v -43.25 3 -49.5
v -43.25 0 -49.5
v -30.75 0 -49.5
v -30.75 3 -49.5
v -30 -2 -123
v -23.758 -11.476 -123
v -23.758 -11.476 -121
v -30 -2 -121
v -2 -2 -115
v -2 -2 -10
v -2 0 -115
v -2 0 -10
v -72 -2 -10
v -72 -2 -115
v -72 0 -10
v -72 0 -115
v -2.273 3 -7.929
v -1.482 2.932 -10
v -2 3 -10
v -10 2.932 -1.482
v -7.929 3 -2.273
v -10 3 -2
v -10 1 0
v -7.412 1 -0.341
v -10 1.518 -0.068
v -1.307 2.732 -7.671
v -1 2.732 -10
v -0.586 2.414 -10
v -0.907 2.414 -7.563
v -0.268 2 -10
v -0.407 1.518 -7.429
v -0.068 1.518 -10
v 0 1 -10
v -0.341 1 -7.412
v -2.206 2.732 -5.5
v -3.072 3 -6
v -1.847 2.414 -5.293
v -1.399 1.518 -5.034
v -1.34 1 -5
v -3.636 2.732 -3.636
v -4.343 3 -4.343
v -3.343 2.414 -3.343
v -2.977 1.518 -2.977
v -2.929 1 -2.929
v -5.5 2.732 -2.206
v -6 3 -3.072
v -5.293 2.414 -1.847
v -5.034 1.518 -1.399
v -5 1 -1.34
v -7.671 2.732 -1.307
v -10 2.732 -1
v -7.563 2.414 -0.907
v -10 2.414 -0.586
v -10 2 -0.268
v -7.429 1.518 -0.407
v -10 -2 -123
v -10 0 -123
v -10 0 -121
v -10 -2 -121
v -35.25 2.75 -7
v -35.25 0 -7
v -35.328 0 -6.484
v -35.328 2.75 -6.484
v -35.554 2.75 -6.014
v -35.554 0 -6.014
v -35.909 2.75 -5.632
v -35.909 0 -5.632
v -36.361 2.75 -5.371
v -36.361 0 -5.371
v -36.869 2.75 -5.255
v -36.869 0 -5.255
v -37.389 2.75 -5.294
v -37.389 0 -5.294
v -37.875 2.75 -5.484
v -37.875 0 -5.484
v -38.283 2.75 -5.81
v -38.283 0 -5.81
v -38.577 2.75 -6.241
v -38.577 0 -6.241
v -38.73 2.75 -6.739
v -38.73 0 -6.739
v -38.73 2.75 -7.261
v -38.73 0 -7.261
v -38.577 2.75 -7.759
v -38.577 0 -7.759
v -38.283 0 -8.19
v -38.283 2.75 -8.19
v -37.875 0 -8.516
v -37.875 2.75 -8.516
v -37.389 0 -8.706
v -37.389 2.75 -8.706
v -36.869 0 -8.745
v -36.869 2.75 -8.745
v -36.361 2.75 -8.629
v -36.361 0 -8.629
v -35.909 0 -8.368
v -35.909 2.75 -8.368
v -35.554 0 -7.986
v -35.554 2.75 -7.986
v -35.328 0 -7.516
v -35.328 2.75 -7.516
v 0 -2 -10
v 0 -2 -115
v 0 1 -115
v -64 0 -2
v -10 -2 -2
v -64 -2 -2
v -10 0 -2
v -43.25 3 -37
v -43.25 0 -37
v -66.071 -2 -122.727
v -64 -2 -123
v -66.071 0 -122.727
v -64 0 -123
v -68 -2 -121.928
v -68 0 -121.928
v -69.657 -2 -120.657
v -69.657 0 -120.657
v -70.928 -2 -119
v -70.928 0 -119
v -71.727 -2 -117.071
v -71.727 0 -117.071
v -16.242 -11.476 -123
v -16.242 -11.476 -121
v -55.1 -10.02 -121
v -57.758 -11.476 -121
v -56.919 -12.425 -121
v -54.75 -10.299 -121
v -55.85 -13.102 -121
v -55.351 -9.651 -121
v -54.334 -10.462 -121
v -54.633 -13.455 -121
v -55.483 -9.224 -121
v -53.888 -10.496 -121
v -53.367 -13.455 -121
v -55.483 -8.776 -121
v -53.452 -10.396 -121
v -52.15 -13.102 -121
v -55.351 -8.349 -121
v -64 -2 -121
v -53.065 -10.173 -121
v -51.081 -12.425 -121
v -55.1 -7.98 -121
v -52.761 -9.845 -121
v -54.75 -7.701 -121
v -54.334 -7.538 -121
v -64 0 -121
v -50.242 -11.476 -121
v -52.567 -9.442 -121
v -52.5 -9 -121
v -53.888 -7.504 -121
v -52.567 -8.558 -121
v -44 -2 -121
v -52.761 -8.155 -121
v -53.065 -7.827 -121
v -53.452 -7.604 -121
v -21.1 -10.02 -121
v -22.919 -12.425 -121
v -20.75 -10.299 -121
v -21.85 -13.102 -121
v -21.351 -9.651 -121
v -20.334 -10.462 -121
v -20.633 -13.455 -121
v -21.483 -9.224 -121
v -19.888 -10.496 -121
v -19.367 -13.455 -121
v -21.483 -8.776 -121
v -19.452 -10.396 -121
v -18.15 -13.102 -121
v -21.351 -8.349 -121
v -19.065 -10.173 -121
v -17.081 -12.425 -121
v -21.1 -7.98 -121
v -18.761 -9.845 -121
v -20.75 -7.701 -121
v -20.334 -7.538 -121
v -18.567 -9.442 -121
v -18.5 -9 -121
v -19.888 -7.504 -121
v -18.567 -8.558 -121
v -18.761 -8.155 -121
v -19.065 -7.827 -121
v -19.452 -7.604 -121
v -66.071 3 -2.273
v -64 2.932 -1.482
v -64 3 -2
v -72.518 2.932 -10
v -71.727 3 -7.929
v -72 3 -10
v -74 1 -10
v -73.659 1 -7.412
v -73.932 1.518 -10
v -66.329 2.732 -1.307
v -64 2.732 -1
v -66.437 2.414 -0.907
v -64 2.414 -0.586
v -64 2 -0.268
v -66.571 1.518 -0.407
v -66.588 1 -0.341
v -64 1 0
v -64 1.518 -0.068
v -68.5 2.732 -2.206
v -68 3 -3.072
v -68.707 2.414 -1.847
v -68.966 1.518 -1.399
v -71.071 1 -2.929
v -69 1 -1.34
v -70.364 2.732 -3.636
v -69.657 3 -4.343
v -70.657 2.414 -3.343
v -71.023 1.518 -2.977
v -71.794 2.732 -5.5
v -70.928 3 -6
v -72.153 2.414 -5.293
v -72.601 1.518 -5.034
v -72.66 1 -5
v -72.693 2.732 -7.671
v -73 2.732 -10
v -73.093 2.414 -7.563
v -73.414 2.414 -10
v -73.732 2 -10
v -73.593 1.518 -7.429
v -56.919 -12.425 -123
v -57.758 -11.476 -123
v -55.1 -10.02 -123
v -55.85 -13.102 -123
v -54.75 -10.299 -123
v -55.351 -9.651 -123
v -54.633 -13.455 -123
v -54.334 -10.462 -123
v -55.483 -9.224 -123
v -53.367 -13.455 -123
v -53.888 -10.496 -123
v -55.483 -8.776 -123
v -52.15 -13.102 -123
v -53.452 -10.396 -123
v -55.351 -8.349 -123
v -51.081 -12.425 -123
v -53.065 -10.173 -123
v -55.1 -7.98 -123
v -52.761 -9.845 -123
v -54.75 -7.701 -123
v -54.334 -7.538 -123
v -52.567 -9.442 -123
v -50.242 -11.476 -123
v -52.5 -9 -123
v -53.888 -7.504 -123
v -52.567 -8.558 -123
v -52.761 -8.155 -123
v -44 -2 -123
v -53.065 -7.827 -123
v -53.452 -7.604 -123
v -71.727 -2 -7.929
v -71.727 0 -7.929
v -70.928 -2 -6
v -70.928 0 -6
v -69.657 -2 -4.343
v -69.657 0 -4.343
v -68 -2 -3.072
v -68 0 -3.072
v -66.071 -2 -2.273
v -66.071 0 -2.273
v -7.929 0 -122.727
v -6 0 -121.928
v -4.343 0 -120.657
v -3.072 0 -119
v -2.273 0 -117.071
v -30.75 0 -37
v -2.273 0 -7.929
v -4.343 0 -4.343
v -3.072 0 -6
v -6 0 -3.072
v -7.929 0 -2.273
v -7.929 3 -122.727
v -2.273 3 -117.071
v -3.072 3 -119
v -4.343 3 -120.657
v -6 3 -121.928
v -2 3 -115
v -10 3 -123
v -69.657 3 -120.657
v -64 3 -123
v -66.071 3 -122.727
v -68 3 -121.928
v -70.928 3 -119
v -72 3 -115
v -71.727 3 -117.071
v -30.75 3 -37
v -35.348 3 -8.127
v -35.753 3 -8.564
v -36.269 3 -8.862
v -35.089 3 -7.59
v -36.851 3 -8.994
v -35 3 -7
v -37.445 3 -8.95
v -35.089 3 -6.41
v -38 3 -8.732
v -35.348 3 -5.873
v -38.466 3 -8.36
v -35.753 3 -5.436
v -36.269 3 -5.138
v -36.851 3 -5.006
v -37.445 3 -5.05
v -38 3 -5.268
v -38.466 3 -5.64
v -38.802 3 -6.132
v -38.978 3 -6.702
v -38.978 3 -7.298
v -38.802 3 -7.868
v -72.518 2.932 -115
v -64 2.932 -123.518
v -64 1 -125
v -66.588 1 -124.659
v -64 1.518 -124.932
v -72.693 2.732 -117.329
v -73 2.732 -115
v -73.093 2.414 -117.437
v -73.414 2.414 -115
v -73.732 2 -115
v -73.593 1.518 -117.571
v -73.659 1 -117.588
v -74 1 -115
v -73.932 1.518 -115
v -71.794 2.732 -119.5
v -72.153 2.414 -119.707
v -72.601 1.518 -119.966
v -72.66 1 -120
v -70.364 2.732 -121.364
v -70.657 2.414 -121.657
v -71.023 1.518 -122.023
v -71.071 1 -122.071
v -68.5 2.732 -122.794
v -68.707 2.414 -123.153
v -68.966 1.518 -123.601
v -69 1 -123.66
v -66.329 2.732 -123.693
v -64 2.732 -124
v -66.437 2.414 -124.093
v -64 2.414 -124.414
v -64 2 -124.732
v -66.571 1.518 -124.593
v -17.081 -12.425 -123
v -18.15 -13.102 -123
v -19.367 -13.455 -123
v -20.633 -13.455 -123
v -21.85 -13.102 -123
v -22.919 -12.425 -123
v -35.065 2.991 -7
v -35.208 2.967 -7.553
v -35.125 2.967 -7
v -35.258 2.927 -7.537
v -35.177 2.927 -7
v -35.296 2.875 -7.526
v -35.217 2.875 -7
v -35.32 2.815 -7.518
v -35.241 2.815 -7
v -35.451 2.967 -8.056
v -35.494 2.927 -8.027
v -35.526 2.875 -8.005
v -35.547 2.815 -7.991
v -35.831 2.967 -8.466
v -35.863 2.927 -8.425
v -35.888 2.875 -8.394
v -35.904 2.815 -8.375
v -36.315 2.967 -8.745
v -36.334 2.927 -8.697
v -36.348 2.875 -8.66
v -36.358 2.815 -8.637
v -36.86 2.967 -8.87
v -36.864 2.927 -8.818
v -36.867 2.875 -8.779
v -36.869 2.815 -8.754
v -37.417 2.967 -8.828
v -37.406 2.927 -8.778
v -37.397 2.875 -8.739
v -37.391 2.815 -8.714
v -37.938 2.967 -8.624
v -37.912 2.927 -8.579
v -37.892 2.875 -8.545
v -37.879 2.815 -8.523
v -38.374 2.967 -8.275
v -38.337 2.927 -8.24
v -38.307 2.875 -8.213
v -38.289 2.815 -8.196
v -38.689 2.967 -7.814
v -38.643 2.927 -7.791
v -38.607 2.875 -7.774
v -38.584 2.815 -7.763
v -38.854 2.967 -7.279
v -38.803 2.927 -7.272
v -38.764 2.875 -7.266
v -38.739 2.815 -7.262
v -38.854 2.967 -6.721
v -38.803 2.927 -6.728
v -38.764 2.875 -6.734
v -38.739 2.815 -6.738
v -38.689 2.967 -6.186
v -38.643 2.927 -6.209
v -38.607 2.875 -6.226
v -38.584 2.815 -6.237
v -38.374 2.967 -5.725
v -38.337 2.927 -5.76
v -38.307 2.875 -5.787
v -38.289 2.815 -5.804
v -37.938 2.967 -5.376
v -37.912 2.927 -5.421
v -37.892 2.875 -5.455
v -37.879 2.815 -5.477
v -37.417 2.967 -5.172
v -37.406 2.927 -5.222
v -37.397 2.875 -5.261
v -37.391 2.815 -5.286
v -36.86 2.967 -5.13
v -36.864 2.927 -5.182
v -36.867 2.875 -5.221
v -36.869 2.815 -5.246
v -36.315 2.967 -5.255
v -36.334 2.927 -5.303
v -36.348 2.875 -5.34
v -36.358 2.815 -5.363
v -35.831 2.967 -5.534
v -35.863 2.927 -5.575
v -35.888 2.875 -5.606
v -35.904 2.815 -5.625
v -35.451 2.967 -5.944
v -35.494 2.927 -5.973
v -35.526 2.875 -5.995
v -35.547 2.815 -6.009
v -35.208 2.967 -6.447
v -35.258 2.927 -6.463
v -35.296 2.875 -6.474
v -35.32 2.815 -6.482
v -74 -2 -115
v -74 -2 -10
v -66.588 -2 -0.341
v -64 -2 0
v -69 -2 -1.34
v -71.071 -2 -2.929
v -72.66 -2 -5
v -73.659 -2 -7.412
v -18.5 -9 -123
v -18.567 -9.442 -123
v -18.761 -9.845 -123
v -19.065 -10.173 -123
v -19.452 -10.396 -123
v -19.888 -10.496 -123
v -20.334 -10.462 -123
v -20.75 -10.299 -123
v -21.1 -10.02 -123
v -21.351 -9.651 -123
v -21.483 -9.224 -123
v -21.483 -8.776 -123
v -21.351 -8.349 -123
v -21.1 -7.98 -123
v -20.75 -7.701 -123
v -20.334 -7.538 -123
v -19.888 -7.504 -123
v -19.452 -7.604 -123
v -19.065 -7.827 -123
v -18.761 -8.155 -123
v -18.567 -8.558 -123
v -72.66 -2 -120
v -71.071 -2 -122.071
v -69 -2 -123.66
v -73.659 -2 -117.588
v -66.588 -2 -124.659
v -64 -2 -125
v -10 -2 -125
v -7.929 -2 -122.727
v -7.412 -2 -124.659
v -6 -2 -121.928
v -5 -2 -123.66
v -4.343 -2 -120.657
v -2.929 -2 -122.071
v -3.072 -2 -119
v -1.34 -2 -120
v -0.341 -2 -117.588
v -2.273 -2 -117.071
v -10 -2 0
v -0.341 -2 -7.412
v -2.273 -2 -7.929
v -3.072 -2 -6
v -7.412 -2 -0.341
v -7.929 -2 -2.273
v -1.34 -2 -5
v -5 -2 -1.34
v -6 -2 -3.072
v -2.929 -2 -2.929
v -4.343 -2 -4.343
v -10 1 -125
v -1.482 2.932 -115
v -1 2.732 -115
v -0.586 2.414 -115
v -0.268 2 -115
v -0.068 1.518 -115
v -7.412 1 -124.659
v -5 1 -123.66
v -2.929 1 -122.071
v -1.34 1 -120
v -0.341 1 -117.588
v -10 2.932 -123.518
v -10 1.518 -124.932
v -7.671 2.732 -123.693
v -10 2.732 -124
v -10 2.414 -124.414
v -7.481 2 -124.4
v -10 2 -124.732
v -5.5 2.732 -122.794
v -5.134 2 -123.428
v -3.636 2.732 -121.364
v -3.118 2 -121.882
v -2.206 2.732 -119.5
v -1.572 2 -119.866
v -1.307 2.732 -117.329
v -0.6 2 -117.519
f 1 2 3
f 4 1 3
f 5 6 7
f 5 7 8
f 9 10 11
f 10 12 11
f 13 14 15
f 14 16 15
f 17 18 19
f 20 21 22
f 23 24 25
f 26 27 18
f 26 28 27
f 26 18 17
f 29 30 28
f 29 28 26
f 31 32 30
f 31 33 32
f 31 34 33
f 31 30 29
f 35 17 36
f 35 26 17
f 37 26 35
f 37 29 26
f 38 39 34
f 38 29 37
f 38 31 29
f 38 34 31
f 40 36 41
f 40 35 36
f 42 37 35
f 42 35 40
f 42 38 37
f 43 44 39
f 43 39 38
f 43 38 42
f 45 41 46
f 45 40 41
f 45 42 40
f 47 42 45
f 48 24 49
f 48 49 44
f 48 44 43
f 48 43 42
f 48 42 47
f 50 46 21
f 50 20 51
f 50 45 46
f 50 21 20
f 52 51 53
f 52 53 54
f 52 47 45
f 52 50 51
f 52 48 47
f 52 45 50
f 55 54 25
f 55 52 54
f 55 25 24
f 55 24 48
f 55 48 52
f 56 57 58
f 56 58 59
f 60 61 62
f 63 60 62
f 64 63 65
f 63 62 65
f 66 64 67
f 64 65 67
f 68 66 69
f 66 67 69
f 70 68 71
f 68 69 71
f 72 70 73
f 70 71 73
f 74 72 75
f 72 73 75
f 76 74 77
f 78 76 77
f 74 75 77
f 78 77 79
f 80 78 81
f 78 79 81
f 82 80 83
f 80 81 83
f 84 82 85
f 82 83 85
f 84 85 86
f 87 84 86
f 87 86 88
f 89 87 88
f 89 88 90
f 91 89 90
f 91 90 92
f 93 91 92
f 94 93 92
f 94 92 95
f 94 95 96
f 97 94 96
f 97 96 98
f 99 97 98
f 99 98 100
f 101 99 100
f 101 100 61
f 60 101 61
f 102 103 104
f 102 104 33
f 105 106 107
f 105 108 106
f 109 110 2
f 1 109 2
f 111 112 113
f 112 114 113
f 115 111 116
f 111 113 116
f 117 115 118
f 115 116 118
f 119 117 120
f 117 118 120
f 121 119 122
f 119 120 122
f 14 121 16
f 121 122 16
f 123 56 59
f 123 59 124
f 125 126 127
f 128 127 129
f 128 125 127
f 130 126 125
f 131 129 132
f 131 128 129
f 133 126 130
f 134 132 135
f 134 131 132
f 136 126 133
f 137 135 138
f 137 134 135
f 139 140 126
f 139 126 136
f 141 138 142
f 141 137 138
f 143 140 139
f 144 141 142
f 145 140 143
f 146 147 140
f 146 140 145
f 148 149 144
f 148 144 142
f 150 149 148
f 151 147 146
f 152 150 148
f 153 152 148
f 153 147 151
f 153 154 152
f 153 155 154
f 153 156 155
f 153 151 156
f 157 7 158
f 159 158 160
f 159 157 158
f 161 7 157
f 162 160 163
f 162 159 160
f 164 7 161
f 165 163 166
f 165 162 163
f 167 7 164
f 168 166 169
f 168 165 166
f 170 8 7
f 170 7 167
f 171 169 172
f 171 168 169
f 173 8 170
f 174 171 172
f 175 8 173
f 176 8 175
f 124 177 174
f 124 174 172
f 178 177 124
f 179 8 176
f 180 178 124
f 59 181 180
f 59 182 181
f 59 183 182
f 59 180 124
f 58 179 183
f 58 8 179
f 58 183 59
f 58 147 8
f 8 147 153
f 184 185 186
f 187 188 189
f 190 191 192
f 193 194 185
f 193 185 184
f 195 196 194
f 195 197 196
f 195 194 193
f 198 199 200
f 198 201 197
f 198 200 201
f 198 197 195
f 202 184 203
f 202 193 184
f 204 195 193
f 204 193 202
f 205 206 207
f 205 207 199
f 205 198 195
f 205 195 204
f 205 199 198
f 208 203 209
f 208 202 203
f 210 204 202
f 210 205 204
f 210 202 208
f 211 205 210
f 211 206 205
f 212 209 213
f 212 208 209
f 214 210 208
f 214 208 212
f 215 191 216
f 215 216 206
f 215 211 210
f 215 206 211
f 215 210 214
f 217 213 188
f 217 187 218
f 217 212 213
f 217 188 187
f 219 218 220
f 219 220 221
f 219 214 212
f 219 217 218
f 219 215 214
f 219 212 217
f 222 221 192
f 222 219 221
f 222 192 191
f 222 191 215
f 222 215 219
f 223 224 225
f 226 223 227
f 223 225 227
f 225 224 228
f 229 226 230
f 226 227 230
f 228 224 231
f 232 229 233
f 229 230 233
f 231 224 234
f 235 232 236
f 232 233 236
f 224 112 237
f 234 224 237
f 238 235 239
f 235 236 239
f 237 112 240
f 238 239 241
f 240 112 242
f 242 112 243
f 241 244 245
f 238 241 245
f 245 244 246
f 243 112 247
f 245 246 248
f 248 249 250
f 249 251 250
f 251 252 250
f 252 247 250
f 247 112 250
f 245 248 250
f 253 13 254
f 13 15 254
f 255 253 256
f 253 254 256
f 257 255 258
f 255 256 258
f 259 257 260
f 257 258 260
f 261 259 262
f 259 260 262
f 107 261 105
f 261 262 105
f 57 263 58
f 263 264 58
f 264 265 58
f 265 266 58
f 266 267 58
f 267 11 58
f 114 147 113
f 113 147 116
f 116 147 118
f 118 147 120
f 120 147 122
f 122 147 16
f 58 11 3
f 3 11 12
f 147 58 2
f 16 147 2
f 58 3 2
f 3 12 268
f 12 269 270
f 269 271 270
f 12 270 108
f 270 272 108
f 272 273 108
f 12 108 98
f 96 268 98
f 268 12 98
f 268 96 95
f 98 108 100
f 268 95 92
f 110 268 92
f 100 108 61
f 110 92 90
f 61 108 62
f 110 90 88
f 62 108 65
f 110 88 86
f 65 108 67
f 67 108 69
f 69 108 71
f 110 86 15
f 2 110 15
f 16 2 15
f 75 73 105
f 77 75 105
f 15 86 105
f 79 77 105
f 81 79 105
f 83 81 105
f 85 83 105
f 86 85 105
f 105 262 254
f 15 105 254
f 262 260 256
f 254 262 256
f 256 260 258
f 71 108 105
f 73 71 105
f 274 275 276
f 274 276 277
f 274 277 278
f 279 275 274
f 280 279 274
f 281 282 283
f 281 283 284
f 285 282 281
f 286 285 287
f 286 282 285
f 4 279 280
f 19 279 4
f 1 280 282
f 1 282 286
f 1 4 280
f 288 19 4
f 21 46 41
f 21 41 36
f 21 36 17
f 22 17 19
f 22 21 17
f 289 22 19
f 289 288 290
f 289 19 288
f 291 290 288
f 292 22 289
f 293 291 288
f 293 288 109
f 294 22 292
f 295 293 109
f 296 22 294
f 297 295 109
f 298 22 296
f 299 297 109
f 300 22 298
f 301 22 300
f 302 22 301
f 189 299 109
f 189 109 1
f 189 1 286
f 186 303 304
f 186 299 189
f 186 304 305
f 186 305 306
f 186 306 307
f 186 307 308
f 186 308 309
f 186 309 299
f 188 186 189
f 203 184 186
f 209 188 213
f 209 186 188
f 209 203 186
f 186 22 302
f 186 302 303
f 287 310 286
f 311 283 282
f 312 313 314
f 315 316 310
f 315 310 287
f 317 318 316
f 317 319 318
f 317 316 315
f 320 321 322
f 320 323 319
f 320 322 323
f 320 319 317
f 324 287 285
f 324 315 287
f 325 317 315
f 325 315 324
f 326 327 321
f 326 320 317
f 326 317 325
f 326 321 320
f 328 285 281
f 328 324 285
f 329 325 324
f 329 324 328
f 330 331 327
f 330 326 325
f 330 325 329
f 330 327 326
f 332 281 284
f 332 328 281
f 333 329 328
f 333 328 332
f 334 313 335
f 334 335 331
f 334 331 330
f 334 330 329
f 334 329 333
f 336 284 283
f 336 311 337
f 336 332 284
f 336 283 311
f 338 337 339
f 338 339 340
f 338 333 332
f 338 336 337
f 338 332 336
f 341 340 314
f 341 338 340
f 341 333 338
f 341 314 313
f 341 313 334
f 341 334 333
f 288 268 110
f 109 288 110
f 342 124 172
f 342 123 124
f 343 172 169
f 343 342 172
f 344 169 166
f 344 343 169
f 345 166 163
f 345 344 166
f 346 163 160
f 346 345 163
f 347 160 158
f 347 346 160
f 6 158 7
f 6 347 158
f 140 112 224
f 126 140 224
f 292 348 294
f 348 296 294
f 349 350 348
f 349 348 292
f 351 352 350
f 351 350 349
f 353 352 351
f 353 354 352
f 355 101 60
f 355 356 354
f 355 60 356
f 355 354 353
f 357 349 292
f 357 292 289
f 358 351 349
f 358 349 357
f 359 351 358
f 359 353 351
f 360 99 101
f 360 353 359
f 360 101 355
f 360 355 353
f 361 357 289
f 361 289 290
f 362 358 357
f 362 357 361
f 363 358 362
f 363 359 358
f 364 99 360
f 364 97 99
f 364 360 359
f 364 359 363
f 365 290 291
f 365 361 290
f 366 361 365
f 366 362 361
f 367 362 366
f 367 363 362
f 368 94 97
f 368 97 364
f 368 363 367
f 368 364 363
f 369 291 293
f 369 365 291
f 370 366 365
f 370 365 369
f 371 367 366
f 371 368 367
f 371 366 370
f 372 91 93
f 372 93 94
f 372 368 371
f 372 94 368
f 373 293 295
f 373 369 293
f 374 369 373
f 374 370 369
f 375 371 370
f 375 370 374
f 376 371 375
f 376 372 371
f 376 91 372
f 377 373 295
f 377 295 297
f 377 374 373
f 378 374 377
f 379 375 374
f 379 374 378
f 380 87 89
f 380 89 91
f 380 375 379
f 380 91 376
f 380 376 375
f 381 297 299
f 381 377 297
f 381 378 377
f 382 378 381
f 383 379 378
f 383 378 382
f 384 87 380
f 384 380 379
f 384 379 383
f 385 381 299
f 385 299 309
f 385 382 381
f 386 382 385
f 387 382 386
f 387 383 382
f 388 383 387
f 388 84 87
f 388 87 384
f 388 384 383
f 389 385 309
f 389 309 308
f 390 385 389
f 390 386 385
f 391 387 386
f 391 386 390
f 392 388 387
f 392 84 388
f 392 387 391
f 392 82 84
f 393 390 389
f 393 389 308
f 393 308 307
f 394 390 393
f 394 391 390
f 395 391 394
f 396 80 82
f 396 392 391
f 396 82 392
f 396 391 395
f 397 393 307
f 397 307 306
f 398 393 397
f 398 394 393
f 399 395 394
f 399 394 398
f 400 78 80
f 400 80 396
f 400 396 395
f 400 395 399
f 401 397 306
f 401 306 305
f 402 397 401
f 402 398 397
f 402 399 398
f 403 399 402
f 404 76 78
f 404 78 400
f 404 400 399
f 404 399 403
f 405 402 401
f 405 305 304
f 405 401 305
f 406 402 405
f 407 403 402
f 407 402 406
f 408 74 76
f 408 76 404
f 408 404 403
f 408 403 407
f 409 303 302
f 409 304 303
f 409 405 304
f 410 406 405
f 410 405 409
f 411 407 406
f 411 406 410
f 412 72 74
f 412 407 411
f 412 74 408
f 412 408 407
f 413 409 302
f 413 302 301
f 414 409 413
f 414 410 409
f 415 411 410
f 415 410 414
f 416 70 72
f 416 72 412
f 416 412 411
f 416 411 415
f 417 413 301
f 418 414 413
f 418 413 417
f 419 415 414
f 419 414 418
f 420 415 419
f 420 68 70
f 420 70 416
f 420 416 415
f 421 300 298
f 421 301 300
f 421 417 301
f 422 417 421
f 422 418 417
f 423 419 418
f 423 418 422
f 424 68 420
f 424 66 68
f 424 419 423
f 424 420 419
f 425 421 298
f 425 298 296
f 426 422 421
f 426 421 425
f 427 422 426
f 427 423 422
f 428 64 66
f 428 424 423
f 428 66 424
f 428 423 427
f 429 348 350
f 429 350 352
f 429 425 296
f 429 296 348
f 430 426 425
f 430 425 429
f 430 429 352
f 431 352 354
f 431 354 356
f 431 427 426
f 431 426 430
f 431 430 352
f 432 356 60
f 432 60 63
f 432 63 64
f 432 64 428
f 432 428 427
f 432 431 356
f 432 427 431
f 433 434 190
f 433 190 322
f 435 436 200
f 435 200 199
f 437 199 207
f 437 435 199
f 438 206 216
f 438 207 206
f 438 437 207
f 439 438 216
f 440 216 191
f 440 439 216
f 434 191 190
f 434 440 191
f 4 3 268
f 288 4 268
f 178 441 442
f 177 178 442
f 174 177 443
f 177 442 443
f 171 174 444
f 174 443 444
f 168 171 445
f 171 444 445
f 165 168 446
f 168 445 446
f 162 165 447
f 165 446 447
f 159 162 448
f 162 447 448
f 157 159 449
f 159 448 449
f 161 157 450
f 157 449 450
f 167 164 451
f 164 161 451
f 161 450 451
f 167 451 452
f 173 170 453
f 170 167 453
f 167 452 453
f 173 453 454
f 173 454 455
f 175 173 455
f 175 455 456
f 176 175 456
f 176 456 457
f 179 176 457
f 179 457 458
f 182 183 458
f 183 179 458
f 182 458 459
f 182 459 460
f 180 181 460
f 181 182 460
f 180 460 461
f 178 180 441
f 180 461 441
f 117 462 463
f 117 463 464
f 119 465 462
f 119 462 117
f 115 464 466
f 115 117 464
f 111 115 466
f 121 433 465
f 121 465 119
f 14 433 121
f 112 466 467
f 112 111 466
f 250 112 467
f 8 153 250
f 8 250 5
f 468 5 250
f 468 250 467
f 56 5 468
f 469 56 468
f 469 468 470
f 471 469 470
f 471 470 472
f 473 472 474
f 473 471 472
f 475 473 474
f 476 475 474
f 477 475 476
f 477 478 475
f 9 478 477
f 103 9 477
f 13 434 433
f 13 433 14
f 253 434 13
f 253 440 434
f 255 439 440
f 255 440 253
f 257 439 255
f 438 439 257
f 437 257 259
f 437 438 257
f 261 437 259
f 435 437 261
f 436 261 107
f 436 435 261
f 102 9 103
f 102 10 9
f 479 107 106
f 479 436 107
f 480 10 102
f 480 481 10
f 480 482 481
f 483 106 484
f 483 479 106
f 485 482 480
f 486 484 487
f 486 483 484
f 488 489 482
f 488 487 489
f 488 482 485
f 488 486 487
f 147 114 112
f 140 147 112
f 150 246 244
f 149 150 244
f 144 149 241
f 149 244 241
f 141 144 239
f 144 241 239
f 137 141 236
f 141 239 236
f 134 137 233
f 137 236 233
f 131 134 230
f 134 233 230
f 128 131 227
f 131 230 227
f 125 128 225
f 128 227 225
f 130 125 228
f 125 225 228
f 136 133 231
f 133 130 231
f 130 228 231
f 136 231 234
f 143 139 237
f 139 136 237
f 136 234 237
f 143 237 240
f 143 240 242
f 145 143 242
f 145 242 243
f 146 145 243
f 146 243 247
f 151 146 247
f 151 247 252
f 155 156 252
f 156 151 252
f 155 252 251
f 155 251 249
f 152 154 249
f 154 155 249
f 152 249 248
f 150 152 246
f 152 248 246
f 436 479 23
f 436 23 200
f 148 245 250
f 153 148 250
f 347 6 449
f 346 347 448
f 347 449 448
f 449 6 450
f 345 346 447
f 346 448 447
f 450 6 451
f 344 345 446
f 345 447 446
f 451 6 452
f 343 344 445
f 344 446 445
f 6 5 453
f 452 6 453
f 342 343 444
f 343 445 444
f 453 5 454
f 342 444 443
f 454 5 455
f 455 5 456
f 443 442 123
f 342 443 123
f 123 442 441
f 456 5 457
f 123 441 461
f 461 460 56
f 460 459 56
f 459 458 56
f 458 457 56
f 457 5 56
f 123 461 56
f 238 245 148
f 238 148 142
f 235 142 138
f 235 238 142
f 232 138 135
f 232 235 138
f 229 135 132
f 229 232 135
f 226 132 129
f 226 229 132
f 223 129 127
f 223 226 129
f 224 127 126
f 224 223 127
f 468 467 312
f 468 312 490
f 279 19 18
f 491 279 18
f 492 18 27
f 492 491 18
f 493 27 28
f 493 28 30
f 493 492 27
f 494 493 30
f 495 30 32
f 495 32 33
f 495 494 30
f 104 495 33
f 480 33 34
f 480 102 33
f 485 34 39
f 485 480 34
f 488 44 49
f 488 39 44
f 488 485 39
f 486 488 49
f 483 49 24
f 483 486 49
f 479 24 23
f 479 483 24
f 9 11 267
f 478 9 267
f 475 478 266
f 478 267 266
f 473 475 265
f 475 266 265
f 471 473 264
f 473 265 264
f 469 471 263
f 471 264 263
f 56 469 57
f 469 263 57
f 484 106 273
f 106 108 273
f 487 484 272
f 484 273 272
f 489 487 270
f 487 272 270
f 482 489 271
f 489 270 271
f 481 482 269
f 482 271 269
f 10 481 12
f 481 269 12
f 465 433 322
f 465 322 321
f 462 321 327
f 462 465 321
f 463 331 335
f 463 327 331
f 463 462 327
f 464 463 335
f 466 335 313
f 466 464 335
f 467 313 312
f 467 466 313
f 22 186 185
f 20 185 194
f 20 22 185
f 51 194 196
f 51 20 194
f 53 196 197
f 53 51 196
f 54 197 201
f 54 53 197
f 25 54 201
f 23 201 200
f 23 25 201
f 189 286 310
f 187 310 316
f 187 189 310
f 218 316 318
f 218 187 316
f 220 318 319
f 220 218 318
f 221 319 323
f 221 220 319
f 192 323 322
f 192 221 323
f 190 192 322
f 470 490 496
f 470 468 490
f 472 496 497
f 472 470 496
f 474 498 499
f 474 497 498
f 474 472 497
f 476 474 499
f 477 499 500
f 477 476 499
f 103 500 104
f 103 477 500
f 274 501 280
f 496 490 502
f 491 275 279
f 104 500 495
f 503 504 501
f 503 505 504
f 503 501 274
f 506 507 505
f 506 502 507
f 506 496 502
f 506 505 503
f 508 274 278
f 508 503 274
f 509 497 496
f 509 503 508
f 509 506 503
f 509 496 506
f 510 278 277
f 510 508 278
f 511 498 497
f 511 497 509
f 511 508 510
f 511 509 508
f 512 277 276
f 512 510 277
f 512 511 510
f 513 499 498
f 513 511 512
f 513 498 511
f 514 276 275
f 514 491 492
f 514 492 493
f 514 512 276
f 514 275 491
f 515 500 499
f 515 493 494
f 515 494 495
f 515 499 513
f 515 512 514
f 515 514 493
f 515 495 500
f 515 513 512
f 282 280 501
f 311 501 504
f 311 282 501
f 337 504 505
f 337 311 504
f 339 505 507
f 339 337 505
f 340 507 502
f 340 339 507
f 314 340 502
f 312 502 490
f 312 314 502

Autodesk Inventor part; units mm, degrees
ref_plane "YZ Plane" through (0, 0, 0) normal (1, 0, 0) x (0, 1, 0)
ref_plane "XZ Plane" through (0, 0, 0) normal (0, 1, 0) x (-1, 0, 0)
ref_plane "XY Plane" through (0, 0, 0) normal (0, 0, 1) x (1, 0, 0)
sketch "Sketch1" plane through (0, 0, 0) normal (0, 1, 0) x (-1, 0, 0)
  line L0 (10, 0) -> (64, 0)
  line L1 (74, -10) -> (74, -115)
  line L2 (64, -125) -> (10, -125)
  line L3 (0, -115) -> (0, -10)
  arc A0 (74, -10) -> (64, 0) centre (64, -10) ccw
  arc A1 (10, 0) -> (0, -10) centre (10, -10) ccw
  arc A2 (0, -115) -> (10, -125) centre (10, -115) ccw
  arc A3 (64, -125) -> (74, -115) centre (64, -115) ccw
  point P0 (0, 0)
  point P1 (74, -125)
  point P2 (0, -125)
  dimension "d0" = 125
  dimension "d1" = 74
  dimension "d2" = 10
extrude "Extrusion1" add sketch "Sketch1" along normal blind 3
sketch "Sketch3" plane through (0, 0, 0) normal (0, -1, 0) x (1, 0, 0)
  line L0 (-64, 0) -> (-10, 0) projected
  arc A0 (-64, 0) -> (-74, -10) centre (-64, -10) ccw projected
  line L1 (-74, -115) -> (-74, -10) projected
  arc A1 (-74, -115) -> (-64, -125) centre (-64, -115) ccw projected
  line L2 (-10, -125) -> (-64, -125) projected
  arc A2 (-10, -125) -> (0, -115) centre (-10, -115) ccw projected
  line L3 (0, -10) -> (0, -115) projected
  arc A3 (0, -10) -> (-10, 0) centre (-10, -10) ccw projected
  line L4 (-10, -2) -> (-64, -2)
  line L5 (-2, -10) -> (-2, -115)
  line L6 (-6.1409, -124.2254) -> (-6.1409, -125)
  line L7 (-72, -115) -> (-72, -10)
  line L8 (-10, -123) -> (-64, -123)
  arc A4 (-2, -10) -> (-10, -2) centre (-10, -10) ccw
  arc A5 (-64, -2) -> (-72, -10) centre (-64, -10) ccw
  arc A6 (-72, -115) -> (-64, -123) centre (-64, -115) ccw
  arc A7 (-10, -123) -> (-2, -115) centre (-10, -115) ccw
  point P0 (0, 0)
  dimension "d5" = 2
  dimension "d6" = 2
  dimension "d7" = 2
  dimension "d8" = 2
  dimension "d10" = 8
extrude "Extrusion2" add sketch "Sketch3" along normal blind 2
sketch "Sketch6" plane through (0, 0, 0) normal (0, -1, 0) x (1, 0, 0)
  arc A0 (-2, -10) -> (-10, -2) centre (-10, -10) ccw projected
  line L0 (-10, -2) -> (-64, -2) projected
  arc A1 (-64, -2) -> (-72, -10) centre (-64, -10) ccw projected
  line L1 (-72, -10) -> (-72, -115) projected
  arc A2 (-72, -115) -> (-64, -123) centre (-64, -115) ccw projected
  line L2 (-64, -123) -> (-10, -123) projected
  arc A3 (-10, -123) -> (-2, -115) centre (-10, -115) ccw projected
  line L3 (-2, -115) -> (-2, -10) projected
  line L4 (-43.25, -49.5) -> (-30.75, -49.5)
  line L5 (-30.75, -49.5) -> (-30.75, -37)
  line L6 (-30.75, -37) -> (-43.25, -37)
  line L7 (-43.25, -37) -> (-43.25, -49.5)
  line L8 (-30.75, -43.25) -> (-2, -43.25)
  line L9 (-43.25, -43.25) -> (-72, -43.25)
  line L10 (-72, -115) -> (-72, -10) projected
  point P0 (0, 0)
  dimension "d28" = 12.5
  dimension "d29" = 12.5
  dimension "d41" = 35
extrude "Extrusion4" cut sketch "Sketch6" against normal up to next contours L5 L4 L7 L6
fillet "Fillet1" radius 2 8 edges at (-2.9289, 3, -122.0711) (-37, 3, -125) (-71.0711, 3, -122.0711) (-74, 3, -62.5) (-71.0711, 3, -2.9289) (-37, 3, 0) (-2.9289, 3, -2.9289) (0, 3, -62.5)
ref_plane "Work Plane1" through (-10, 0, -123) normal (0, 0, 1) x (1, 0, 0)
sketch "Sketch8" plane through (-10, 0, -123) normal (0, 0, 1) x (1, 0, 0)
  line L0 (-54, 0) -> (0, 0) projected
  line L1 (-54, 0) -> (-54, -2) projected
  line L2 (0, -2) -> (-54, -2) projected
  line L3 (0, 0) -> (0, -2) projected
  circle A0 centre (-10, -9) radius 4.5
  line L4 (0, -2) -> (-54, -2) projected
  line L5 (-27, -2) -> (-27, -24.2121)
  line L6 (0, 0) -> (0, -2) projected
  line L7 (0, -2) -> (-6.2421, -11.4755)
  line L8 (-13.7579, -11.4755) -> (-20, -2)
  circle A1 centre (-10, -9) radius 1.5
  line L9 (-54, 0) -> (-54, -2)
  circle A2 centre (-44, -9) radius 4.5
  line L10 (-54, 0) -> (-54, -2)
  line L11 (-54, -2) -> (-47.7579, -11.4755)
  line L12 (-40.2421, -11.4755) -> (-34, -2)
  circle A3 centre (-44, -9) radius 1.5
  line L13 (-34, -2) -> (-54, -2)
  point P0 (10, 0)
  dimension "d34" = 7
  dimension "d35" = 9
  dimension "d36" = 10
  dimension "d37" = 10
  dimension "d38" = 3
extrude "Extrusion5" add sketch "Sketch8" along normal blind 2
sketch "Sketch10" plane through (0, 0, 0) normal (0, -1, 0) x (1, 0, 0)
  line L0 (-10, -2) -> (-64, -2) projected
  line L1 (-37, -2) -> (-37, -7)
  circle A0 centre (-37, -7) radius 1.75
  point P0 (0, 0)
  dimension "d42" = 5
  dimension "d43" = 3.5
extrude "Extrusion6" cut sketch "Sketch10" against normal up to surface (3 mm away)
fillet "Fillet2" radius 0.25 1 edges at (-38.75, 3, -7)
properties part number "Cover" material "PC/ABS Plastic"
